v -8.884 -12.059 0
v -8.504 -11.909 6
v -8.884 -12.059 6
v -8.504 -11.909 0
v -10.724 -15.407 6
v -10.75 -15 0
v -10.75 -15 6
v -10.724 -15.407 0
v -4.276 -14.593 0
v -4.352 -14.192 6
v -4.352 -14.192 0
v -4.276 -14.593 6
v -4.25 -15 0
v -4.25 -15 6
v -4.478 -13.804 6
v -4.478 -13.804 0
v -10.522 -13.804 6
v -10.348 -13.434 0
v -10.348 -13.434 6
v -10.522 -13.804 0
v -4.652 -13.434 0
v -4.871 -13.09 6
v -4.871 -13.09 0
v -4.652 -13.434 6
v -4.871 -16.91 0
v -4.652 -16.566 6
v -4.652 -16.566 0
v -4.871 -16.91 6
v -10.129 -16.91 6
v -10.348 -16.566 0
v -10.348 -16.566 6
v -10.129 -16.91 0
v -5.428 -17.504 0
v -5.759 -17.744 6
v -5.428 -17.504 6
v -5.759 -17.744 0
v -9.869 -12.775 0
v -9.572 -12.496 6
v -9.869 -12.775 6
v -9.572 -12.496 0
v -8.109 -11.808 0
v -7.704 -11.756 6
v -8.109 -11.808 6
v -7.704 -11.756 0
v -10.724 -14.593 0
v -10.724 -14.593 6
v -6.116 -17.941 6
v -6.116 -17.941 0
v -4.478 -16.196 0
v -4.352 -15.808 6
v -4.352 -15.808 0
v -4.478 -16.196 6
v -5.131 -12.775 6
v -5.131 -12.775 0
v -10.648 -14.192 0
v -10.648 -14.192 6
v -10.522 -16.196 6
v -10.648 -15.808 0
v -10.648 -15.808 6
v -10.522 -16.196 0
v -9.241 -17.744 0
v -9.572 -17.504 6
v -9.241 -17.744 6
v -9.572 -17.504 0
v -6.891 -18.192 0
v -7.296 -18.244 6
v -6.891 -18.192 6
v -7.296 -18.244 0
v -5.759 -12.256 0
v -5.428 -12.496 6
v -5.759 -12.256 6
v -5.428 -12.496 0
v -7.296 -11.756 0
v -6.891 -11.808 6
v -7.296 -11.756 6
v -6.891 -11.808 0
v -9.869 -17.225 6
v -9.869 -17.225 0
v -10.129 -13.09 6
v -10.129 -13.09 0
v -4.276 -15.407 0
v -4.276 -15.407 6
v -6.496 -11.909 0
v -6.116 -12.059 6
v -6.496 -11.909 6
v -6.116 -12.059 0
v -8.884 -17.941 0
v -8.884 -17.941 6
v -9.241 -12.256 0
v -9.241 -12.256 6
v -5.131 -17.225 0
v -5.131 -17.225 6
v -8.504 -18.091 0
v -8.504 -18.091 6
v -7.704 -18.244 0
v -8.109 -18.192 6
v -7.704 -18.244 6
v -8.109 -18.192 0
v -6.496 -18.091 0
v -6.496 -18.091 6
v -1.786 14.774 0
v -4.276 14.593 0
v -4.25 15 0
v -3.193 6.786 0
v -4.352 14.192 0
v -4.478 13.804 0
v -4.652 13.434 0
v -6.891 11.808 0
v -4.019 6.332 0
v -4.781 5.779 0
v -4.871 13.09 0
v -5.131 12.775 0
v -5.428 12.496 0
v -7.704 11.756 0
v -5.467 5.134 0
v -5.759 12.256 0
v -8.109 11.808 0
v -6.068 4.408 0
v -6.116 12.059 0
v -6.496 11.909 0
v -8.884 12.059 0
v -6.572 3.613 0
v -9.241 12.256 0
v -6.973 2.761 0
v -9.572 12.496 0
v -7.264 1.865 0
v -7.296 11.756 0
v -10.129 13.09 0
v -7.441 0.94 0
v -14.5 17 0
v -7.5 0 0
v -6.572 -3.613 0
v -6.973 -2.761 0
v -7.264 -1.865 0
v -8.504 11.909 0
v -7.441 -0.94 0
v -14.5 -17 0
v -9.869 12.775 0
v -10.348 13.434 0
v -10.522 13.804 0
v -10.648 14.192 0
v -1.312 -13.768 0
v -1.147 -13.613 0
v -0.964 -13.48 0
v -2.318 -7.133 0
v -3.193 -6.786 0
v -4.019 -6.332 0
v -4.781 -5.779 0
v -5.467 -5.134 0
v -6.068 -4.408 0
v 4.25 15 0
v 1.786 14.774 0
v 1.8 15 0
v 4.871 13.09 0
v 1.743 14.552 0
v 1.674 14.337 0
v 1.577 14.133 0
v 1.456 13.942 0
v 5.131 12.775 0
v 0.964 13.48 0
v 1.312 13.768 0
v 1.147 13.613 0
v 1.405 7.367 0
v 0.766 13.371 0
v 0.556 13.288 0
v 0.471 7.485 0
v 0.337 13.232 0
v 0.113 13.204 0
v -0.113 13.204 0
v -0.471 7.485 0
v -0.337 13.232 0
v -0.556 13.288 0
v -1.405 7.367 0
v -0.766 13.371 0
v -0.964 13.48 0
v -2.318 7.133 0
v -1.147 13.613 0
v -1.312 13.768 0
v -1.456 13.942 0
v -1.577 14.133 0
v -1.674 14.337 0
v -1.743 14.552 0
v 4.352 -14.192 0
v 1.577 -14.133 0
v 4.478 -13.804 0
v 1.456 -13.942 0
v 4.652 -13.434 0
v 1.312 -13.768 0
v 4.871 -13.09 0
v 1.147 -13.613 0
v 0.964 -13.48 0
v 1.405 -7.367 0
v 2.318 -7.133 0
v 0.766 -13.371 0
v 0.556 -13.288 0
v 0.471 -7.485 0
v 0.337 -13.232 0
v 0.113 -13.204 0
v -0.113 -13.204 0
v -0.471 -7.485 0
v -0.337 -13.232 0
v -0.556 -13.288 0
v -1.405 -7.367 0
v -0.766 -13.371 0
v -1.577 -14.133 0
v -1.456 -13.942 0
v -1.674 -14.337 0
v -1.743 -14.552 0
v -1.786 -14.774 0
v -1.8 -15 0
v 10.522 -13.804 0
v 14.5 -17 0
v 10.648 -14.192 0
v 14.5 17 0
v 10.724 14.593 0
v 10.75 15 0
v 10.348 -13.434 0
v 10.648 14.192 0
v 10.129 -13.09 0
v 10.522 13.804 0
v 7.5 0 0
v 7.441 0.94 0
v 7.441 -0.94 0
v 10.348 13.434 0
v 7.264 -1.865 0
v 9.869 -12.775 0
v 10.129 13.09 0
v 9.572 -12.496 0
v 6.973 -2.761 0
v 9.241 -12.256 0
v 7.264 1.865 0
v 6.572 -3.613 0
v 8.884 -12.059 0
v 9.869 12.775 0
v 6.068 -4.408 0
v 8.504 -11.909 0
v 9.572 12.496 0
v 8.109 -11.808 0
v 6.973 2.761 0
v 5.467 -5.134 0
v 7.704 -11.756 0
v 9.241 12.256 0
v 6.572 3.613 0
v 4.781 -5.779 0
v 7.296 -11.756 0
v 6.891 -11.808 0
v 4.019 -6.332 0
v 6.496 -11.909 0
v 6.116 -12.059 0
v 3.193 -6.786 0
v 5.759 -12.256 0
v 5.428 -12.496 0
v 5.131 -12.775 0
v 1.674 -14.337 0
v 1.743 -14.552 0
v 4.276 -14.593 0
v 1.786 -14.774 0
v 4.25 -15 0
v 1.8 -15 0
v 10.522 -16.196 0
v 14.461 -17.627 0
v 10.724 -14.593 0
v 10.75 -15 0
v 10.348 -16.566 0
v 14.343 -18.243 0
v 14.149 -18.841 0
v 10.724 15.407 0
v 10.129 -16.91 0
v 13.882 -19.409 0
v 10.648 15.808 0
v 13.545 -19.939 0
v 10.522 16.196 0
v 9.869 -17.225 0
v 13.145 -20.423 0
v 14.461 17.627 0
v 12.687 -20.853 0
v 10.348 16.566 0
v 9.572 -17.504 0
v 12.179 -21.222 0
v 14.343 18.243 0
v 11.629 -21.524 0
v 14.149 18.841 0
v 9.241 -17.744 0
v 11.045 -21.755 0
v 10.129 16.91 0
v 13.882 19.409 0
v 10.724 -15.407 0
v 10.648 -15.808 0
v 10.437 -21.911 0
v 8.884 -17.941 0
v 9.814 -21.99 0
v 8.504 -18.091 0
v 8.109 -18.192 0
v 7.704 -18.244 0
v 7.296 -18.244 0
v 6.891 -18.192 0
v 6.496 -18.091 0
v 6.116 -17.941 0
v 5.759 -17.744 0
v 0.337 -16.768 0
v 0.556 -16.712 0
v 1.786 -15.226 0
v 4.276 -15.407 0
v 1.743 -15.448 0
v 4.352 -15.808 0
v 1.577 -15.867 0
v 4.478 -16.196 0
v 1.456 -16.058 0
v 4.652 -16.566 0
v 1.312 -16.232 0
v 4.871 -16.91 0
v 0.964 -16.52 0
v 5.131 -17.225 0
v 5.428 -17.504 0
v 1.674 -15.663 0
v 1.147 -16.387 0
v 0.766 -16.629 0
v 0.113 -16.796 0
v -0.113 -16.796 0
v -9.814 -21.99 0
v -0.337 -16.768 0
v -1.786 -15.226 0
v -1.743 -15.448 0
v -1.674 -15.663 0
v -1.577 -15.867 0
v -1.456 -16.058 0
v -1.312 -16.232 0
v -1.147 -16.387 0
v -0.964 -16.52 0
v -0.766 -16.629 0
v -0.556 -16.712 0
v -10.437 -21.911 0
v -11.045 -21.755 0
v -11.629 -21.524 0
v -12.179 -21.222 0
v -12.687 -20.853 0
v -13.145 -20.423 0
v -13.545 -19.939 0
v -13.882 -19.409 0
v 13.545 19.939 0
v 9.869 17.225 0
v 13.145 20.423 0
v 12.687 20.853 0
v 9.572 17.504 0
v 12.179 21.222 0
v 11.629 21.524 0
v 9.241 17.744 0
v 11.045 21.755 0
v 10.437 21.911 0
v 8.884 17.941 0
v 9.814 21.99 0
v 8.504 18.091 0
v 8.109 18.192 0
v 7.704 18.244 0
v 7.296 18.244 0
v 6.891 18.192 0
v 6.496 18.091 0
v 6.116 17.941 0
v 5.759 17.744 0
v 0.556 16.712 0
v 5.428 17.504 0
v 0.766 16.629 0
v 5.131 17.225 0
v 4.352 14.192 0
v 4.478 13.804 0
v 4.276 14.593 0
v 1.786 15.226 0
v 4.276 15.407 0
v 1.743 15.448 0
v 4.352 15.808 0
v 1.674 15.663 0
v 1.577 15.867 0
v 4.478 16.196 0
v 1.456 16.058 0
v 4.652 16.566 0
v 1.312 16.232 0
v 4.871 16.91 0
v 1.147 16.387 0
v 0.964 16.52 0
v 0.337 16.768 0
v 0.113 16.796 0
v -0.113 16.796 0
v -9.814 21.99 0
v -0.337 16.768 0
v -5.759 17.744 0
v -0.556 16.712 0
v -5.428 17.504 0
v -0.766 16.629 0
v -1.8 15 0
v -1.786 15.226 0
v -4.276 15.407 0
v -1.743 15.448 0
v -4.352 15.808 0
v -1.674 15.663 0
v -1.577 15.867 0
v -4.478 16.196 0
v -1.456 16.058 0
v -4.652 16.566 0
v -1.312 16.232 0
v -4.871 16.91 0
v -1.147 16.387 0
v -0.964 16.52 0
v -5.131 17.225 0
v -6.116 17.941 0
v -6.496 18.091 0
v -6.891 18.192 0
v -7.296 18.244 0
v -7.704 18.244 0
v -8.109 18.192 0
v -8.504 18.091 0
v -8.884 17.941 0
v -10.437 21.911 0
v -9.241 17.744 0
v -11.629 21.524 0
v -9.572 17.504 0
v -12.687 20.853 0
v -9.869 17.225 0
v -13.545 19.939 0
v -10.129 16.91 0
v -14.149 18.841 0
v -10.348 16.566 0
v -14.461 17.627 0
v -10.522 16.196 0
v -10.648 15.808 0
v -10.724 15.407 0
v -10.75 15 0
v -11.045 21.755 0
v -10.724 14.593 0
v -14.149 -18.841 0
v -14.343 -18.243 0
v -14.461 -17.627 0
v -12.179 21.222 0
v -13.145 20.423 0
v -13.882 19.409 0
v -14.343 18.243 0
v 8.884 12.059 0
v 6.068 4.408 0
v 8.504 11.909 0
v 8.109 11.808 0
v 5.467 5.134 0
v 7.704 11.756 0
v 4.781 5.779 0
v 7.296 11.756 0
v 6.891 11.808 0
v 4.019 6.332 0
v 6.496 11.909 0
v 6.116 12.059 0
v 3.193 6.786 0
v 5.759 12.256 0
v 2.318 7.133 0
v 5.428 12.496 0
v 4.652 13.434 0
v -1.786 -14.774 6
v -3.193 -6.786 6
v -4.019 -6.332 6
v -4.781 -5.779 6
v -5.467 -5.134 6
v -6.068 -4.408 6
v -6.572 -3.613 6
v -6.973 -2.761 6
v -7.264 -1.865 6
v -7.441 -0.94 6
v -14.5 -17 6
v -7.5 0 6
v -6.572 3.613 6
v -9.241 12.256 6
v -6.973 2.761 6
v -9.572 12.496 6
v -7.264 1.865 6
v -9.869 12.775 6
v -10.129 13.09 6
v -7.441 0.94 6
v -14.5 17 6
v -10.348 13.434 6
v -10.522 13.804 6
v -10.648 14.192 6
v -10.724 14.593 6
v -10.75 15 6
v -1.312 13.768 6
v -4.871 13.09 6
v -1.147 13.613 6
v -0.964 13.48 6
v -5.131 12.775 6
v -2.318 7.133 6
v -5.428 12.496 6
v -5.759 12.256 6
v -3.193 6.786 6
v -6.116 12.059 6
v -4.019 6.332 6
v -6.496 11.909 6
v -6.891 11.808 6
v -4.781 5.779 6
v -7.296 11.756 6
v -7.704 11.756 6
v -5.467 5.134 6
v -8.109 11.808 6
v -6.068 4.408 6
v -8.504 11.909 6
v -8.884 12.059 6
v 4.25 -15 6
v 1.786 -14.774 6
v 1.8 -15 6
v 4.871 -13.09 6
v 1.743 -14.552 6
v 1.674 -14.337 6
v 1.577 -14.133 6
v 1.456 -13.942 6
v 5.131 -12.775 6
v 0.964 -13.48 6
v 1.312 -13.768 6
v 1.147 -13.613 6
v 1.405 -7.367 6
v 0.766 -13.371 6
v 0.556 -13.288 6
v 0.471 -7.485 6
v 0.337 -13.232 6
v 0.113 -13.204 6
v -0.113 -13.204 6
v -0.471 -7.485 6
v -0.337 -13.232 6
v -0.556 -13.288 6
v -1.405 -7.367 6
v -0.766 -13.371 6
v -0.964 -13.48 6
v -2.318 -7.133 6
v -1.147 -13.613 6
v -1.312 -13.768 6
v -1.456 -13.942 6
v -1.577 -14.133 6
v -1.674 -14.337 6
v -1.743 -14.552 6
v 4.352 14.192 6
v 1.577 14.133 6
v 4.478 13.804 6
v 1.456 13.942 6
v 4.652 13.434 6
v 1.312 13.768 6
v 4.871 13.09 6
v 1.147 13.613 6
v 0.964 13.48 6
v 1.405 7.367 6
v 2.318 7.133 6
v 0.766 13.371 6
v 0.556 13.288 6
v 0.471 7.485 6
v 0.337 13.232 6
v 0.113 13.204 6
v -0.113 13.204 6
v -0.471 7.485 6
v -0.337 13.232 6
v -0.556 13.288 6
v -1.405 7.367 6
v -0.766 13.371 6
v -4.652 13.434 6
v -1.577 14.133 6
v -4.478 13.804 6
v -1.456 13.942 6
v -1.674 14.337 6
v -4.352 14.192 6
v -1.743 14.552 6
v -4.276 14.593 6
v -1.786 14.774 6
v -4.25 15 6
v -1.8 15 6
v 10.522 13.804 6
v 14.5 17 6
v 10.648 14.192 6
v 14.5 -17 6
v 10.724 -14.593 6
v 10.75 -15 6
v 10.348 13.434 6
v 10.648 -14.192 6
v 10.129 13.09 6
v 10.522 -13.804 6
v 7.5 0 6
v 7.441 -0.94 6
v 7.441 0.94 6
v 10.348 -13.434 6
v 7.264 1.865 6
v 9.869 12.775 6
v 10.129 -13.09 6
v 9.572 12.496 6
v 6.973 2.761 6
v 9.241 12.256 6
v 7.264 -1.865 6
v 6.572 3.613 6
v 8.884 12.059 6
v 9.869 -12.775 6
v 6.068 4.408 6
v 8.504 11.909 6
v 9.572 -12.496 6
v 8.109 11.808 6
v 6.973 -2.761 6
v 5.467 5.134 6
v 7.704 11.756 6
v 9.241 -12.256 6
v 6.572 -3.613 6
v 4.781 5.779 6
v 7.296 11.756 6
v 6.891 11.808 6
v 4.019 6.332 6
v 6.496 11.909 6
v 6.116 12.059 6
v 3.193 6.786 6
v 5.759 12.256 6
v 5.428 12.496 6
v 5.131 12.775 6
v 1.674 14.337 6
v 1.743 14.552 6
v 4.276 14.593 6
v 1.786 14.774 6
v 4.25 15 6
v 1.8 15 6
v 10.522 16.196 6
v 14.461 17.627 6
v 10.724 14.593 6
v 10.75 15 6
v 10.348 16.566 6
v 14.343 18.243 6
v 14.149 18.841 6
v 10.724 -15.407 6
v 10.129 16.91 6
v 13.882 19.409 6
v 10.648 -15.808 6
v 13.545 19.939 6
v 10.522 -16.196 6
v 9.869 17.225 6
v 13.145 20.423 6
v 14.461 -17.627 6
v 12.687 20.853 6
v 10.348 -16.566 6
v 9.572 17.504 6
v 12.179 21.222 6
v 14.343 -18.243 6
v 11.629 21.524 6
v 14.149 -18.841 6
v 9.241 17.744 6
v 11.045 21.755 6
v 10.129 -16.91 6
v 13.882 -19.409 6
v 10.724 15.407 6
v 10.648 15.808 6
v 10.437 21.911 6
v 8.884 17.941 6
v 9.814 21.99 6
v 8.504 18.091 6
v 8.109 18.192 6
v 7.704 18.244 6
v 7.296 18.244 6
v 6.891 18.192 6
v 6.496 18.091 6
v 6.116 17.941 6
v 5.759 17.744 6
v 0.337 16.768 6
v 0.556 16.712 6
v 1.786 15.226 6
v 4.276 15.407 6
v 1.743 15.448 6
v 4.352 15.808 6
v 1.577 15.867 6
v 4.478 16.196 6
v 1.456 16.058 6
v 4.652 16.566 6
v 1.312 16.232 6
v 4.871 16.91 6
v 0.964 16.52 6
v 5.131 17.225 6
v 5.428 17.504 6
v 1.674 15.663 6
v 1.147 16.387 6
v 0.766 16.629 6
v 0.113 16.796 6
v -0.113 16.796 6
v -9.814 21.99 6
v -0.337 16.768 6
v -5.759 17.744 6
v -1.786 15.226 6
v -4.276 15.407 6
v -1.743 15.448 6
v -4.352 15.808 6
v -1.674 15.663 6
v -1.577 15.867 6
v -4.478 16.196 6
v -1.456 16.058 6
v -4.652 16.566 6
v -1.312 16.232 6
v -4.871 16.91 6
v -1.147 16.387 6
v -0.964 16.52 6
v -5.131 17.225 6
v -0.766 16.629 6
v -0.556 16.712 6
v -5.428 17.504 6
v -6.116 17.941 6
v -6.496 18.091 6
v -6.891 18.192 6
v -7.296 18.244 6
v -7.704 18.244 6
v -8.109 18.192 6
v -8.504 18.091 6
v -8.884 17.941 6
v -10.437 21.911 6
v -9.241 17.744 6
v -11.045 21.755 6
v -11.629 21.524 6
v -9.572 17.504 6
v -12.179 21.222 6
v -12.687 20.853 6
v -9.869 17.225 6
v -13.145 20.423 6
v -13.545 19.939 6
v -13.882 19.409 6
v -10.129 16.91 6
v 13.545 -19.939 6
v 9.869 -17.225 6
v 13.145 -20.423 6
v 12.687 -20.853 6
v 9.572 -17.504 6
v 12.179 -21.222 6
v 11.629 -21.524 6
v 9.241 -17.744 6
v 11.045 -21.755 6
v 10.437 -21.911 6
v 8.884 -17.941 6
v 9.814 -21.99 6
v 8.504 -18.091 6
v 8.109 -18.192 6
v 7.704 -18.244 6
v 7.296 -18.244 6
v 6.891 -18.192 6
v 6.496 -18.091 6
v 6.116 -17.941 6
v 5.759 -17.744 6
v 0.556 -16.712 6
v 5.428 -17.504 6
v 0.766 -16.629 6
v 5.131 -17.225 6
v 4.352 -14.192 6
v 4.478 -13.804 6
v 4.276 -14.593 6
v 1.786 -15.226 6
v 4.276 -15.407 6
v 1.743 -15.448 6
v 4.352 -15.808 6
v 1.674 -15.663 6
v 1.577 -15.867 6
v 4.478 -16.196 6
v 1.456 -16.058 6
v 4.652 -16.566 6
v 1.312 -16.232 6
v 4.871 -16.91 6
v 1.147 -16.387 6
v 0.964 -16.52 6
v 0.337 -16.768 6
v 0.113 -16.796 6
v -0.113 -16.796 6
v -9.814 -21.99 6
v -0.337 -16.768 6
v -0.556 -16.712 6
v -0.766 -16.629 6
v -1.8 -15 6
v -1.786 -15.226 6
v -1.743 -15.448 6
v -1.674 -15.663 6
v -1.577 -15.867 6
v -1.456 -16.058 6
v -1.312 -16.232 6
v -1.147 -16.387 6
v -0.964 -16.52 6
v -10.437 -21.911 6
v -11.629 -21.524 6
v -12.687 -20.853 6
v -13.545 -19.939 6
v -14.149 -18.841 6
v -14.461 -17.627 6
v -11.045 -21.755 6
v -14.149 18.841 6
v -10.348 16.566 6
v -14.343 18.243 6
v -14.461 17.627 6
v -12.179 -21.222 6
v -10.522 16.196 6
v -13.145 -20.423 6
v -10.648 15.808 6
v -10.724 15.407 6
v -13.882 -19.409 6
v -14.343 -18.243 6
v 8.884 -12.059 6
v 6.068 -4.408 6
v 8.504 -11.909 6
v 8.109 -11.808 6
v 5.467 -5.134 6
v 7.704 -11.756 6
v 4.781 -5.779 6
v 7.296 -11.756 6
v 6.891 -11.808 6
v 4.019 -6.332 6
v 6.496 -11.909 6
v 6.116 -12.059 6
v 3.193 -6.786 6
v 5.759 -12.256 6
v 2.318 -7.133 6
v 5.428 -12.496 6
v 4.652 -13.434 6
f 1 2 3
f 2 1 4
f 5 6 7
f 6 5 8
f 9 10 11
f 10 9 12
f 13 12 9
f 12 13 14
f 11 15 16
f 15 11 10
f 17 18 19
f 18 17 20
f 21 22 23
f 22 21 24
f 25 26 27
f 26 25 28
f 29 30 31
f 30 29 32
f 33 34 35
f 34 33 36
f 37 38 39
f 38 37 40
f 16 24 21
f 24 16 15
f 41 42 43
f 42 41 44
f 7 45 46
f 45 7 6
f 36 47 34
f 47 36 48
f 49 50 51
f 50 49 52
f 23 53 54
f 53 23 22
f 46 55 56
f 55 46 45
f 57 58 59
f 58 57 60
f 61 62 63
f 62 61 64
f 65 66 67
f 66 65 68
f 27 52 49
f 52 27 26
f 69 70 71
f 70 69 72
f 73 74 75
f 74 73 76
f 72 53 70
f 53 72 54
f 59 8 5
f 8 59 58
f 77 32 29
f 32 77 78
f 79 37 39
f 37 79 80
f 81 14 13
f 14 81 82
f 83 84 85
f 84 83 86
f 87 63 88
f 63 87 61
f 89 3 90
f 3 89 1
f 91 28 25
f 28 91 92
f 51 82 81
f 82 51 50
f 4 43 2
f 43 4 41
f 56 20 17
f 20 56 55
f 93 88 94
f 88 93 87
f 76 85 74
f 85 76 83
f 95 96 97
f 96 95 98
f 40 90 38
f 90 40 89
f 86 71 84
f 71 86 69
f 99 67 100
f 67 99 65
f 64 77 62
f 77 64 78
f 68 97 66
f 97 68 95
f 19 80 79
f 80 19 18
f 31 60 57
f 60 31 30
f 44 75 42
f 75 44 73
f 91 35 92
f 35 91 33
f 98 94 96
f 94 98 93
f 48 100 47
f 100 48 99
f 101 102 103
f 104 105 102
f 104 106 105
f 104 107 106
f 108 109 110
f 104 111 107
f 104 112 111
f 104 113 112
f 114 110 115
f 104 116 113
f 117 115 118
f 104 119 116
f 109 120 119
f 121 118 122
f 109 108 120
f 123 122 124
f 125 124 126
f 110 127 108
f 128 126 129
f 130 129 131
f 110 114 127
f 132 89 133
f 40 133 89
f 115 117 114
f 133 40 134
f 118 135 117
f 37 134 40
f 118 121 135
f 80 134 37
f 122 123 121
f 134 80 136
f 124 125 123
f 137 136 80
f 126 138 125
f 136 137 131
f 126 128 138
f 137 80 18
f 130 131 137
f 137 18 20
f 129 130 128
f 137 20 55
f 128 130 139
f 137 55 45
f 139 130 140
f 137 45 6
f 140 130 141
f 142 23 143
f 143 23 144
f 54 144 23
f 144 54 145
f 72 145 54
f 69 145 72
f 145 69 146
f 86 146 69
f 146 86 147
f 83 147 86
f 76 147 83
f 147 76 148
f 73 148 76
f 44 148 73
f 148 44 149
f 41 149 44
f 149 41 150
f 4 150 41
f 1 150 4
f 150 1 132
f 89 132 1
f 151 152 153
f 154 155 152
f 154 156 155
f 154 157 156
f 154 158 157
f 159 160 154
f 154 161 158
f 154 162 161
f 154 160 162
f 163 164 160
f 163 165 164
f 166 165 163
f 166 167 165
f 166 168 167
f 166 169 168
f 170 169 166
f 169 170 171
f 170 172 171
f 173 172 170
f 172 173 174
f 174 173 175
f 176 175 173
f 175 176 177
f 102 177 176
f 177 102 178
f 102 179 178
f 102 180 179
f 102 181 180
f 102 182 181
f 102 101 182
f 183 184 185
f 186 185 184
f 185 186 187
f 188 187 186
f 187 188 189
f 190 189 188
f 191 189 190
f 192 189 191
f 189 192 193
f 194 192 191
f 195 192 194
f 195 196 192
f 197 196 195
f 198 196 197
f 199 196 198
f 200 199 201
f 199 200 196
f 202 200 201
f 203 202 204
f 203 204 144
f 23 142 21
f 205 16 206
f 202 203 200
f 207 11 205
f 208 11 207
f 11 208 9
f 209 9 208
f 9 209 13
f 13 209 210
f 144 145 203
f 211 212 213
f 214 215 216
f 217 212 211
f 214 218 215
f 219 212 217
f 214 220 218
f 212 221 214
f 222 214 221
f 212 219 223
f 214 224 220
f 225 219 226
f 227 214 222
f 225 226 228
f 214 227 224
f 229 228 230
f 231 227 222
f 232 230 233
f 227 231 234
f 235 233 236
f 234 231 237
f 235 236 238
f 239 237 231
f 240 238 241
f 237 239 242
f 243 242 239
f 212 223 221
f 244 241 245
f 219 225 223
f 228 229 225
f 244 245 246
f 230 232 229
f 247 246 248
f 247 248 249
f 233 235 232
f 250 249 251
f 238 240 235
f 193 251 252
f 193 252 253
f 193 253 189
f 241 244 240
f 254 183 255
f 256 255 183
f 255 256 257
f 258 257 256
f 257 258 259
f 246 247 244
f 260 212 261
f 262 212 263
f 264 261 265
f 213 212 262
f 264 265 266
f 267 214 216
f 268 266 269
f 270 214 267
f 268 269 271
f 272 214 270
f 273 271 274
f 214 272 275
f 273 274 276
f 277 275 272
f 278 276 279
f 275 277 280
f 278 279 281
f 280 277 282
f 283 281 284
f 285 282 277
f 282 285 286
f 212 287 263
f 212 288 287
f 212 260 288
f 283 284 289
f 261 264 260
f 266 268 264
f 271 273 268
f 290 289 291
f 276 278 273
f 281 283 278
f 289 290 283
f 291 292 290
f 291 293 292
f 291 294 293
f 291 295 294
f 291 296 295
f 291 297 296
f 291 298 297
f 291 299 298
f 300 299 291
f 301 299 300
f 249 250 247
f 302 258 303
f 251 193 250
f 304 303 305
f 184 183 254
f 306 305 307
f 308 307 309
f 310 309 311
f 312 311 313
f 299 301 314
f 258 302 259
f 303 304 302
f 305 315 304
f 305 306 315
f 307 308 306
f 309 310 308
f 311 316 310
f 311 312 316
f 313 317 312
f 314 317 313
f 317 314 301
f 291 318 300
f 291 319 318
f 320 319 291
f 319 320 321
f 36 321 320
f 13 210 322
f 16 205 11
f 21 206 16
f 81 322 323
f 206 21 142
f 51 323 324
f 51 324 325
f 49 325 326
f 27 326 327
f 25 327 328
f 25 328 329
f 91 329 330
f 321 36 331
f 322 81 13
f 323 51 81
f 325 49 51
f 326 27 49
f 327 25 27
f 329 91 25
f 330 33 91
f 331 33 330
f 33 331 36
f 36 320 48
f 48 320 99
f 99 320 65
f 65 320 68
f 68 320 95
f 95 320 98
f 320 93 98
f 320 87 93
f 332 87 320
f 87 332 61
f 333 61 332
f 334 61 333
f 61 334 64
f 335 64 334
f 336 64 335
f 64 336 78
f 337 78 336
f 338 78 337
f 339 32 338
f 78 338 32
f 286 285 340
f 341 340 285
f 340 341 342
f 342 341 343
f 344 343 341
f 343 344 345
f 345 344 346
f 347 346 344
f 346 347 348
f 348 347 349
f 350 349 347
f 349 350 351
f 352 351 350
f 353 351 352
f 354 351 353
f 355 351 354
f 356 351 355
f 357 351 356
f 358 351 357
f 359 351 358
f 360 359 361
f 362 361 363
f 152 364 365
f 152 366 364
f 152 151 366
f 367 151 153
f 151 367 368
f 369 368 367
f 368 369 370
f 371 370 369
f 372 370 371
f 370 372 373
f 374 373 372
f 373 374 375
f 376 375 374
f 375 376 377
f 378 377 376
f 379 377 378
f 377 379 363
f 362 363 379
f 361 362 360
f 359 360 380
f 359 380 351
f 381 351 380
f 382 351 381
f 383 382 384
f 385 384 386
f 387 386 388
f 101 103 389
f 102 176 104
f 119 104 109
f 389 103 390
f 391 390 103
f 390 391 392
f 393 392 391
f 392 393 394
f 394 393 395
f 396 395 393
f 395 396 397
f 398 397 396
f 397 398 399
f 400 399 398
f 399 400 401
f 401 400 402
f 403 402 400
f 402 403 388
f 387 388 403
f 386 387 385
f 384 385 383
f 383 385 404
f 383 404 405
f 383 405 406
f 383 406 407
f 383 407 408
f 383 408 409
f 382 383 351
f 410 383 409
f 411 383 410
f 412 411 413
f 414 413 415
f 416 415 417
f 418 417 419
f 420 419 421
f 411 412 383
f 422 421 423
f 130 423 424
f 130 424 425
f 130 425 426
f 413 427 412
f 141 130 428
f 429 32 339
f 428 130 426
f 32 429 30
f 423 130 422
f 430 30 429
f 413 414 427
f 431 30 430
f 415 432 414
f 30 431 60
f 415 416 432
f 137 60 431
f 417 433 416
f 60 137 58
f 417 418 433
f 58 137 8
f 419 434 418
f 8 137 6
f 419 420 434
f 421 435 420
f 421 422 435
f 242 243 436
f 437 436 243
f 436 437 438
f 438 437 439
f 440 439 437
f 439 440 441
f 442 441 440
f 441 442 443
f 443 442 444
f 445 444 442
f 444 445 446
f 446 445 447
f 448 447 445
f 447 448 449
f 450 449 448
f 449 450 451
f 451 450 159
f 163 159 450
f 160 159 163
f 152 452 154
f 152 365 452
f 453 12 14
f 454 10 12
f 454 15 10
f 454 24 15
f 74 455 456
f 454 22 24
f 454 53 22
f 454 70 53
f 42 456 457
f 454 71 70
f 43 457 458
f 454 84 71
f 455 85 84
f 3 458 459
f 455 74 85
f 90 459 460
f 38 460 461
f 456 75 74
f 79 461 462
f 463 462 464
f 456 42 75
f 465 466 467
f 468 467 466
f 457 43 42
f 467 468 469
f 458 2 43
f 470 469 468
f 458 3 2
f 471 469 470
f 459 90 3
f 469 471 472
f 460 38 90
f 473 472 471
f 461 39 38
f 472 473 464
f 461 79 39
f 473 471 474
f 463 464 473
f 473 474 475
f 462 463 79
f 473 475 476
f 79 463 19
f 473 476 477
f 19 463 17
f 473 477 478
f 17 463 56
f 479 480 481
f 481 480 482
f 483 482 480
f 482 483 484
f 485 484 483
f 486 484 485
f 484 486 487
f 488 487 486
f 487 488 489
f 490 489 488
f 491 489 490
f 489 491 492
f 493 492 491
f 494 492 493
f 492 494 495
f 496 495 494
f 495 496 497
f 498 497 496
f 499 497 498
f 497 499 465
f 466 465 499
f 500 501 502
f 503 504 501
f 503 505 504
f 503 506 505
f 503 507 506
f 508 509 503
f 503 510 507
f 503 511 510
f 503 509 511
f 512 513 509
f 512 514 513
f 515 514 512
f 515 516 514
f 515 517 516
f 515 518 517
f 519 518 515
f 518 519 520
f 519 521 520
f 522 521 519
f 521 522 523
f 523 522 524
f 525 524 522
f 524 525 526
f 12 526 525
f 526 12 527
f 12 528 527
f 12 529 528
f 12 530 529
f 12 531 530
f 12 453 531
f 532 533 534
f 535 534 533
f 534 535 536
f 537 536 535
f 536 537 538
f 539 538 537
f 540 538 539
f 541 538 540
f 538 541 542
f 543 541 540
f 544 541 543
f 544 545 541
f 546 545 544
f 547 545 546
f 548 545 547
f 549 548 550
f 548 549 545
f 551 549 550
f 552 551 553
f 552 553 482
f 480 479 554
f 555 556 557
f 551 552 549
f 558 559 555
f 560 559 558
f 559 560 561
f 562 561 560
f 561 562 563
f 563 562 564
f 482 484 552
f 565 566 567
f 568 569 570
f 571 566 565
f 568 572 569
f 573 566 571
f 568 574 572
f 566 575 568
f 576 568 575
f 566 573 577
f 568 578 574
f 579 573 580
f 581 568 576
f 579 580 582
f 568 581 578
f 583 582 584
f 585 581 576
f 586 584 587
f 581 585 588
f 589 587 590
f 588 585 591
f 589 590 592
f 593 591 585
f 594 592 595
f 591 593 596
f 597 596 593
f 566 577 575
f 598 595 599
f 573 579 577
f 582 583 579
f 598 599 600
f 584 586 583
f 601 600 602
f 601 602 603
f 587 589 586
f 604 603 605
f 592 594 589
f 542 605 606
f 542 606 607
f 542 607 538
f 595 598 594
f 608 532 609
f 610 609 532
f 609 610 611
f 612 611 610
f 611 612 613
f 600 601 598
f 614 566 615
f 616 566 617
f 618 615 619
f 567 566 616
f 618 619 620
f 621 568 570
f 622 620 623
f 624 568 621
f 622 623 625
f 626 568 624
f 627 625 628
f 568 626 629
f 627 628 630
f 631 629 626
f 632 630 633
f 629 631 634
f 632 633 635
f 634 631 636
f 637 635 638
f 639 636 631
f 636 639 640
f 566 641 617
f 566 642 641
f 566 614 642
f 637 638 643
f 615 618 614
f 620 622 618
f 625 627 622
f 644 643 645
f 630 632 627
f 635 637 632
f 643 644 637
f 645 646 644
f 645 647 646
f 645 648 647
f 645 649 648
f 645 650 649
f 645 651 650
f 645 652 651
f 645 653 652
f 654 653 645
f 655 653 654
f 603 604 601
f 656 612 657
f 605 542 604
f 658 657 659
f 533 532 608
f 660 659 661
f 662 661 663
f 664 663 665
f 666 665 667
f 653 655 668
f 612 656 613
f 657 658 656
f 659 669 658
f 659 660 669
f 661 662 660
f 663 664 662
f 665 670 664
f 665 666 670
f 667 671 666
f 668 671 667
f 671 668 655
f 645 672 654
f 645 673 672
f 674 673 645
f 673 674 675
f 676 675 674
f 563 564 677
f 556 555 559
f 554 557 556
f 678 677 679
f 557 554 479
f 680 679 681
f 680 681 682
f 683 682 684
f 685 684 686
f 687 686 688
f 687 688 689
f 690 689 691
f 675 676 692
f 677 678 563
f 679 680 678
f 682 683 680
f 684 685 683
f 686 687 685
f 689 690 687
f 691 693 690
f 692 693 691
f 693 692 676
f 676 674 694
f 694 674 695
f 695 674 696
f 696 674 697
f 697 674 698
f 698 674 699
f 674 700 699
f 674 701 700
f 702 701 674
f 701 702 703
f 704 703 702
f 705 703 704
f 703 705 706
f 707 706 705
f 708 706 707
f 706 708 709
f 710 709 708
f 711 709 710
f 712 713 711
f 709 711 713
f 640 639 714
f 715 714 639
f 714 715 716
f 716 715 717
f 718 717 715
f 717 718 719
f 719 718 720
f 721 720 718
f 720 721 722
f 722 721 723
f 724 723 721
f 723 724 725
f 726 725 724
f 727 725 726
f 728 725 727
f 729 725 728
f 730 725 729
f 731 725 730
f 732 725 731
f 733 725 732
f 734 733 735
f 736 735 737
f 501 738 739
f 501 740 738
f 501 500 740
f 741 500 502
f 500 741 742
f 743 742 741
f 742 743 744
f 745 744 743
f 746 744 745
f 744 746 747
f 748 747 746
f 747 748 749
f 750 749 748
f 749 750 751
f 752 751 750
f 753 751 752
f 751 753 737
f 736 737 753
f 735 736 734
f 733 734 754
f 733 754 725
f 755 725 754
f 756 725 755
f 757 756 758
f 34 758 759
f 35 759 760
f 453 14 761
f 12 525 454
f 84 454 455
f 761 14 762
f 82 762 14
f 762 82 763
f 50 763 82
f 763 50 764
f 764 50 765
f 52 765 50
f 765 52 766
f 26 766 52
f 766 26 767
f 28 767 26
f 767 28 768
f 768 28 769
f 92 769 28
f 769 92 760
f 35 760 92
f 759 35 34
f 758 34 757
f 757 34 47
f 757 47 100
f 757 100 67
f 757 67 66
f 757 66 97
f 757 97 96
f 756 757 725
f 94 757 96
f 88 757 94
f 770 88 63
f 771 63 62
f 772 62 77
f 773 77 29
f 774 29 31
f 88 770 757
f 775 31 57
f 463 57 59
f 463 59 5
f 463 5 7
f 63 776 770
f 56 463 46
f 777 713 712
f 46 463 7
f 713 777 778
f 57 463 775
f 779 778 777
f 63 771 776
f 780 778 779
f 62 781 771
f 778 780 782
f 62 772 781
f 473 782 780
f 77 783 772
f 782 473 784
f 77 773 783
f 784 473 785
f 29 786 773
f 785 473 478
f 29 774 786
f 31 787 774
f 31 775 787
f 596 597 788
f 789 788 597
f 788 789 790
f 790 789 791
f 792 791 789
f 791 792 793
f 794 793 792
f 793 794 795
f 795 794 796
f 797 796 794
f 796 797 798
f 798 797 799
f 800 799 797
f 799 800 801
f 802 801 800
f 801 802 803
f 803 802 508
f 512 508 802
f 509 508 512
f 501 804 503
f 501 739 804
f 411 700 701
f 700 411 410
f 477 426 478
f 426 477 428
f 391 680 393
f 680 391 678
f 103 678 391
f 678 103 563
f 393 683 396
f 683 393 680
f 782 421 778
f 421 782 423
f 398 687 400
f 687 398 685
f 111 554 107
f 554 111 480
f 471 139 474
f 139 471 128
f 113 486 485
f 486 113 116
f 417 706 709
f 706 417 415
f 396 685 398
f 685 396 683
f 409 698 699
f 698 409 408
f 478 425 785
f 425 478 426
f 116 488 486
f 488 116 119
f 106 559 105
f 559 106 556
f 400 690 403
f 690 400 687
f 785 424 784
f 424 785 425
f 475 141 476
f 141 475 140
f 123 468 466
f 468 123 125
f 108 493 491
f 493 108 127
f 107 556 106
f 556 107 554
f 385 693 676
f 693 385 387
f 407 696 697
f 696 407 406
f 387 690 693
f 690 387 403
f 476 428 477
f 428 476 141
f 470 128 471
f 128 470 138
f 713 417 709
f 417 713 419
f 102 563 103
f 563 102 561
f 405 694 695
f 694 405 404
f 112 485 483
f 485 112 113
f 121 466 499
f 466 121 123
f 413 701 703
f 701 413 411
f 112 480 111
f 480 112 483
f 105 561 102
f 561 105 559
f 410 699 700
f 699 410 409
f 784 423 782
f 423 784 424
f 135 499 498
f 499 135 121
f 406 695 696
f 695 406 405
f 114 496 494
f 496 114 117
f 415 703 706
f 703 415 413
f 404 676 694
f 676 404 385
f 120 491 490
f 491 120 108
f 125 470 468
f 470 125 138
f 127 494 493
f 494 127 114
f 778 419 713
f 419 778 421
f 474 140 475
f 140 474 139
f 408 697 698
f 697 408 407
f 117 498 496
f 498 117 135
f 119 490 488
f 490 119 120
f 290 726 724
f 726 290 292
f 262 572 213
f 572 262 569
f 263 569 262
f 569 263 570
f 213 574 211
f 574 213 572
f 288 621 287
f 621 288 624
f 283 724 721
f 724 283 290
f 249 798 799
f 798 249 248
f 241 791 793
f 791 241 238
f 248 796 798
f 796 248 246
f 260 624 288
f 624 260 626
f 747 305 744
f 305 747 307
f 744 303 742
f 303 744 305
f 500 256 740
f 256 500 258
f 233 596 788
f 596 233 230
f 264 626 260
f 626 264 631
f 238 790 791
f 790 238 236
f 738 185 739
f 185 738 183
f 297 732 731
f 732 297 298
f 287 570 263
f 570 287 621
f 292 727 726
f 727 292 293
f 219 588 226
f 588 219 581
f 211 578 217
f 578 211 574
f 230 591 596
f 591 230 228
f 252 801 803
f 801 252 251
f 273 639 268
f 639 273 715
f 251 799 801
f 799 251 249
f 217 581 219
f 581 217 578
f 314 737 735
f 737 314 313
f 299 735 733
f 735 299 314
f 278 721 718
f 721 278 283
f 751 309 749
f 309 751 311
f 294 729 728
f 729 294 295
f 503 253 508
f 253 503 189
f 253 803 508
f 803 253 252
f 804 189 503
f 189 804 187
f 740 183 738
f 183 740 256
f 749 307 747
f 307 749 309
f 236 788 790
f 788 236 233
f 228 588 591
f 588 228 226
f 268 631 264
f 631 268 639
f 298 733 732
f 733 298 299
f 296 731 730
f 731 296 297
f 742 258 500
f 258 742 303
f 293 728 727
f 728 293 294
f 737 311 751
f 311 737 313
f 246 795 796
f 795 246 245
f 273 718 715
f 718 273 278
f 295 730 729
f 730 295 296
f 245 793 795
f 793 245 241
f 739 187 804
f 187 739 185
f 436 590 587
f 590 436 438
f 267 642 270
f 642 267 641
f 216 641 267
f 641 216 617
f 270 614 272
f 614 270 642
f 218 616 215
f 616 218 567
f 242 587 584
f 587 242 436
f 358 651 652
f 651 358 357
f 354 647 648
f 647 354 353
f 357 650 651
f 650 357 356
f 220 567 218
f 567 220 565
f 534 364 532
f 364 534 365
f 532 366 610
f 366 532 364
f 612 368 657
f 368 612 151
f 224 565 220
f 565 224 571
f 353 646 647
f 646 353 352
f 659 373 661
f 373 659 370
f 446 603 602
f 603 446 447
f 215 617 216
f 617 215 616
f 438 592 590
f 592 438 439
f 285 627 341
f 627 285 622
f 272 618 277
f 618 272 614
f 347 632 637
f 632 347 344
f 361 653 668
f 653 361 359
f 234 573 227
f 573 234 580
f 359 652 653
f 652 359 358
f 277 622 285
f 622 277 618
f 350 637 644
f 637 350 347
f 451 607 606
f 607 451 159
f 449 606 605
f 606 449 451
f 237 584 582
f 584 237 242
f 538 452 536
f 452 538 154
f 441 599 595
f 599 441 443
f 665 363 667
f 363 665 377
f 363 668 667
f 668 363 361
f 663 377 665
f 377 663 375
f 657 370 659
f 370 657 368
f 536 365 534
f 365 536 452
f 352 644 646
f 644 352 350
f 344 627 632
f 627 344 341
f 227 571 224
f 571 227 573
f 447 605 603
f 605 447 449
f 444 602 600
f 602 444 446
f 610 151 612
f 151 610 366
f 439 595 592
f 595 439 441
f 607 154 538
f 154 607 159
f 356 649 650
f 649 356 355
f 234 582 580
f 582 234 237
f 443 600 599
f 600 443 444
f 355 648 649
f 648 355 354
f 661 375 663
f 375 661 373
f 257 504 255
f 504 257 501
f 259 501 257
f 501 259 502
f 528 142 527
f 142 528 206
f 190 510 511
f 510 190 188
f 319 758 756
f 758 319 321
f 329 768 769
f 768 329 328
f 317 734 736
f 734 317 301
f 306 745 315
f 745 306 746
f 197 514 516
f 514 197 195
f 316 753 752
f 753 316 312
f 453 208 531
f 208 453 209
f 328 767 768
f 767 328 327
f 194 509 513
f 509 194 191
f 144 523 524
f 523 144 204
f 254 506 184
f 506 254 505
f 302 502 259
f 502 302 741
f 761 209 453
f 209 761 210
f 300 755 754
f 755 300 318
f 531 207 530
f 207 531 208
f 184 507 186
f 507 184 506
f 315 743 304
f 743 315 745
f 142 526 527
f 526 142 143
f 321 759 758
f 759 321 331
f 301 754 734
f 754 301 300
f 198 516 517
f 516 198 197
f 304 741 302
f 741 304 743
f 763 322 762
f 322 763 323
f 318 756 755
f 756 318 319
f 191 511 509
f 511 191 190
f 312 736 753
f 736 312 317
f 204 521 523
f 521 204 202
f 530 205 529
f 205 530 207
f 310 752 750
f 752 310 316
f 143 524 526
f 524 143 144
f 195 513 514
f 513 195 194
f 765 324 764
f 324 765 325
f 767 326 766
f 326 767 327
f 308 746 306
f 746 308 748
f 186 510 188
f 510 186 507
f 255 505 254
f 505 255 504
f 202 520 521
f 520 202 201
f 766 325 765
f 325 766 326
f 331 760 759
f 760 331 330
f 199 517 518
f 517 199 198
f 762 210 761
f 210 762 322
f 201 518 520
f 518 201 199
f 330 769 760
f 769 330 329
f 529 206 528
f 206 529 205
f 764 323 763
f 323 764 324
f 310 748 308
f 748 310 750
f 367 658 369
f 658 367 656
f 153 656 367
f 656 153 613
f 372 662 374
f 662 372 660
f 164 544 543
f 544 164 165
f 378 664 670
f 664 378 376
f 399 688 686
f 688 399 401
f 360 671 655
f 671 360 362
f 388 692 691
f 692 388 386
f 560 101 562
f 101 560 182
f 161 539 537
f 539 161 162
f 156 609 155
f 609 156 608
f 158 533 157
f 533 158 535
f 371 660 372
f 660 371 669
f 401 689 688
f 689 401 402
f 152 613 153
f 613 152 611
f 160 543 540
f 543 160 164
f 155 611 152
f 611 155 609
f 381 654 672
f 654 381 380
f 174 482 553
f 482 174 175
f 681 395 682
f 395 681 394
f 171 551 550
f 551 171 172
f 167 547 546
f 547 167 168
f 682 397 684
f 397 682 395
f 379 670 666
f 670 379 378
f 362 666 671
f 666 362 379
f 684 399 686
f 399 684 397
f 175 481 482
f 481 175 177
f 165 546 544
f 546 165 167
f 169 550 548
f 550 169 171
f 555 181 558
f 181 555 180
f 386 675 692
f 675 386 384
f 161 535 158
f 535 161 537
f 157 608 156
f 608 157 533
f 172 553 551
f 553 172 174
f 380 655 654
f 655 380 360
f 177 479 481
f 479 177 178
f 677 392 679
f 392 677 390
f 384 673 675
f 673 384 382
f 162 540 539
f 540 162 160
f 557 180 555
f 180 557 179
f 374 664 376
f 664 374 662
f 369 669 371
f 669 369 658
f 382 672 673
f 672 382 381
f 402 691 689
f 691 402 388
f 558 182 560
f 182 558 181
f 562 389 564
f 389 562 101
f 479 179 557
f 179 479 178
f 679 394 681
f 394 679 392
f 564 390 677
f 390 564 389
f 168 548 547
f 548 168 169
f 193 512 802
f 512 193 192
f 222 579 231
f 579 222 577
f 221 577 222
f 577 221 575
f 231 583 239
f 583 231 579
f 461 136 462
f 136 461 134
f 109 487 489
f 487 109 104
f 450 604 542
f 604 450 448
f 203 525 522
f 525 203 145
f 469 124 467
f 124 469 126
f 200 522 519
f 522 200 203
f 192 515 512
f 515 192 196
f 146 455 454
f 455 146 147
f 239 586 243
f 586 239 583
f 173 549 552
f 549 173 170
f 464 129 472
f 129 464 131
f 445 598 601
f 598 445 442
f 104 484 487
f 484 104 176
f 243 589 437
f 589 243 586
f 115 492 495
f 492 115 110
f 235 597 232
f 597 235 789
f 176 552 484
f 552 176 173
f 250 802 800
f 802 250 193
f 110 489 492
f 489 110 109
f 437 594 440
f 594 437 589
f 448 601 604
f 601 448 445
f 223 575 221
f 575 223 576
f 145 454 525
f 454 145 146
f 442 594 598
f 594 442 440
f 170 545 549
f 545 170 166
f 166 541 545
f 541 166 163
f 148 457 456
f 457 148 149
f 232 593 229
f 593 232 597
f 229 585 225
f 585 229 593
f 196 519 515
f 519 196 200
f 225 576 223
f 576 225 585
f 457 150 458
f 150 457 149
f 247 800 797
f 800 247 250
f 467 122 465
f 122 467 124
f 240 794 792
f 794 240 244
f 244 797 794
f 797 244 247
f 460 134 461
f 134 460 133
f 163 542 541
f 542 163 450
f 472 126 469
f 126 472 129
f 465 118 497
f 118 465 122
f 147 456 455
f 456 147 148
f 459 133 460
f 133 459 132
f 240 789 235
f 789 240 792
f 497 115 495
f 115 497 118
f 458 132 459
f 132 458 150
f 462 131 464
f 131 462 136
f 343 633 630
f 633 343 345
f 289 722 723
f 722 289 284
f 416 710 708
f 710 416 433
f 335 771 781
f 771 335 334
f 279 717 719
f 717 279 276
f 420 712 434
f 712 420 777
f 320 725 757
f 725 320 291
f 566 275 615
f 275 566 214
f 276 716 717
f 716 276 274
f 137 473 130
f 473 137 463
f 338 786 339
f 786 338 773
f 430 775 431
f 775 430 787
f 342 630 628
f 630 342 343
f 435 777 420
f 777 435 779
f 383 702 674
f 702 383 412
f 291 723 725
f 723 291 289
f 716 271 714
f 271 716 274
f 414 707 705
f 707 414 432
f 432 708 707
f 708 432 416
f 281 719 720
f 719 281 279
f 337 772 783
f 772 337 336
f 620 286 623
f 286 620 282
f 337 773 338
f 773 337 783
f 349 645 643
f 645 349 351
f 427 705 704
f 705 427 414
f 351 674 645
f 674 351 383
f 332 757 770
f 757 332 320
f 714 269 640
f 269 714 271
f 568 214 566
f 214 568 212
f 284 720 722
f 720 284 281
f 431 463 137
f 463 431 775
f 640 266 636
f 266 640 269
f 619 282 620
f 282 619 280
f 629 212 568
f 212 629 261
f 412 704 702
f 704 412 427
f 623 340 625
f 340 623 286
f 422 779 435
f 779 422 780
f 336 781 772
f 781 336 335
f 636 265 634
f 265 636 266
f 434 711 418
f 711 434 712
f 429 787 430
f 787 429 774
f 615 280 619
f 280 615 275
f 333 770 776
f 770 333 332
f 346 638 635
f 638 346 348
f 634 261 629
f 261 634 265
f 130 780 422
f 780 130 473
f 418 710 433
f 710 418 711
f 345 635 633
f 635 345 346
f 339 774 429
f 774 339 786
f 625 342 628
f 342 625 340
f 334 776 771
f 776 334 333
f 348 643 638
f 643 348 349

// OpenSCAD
$fn = 50;

difference() {
	union() {
		hull() {
			translate(v = [-9.5, 17.0, 0]) {
				cylinder(h = 6, r = 5);
			}
			translate(v = [9.5, 17.0, 0]) {
				cylinder(h = 6, r = 5);
			}
			translate(v = [-9.5, -17.0, 0]) {
				cylinder(h = 6, r = 5);
			}
			translate(v = [9.5, -17.0, 0]) {
				cylinder(h = 6, r = 5);
			}
		}
	}
	union() {
		translate(v = [-7.5, -15.0, 0]) {
			cylinder(h = 6, r = 3.25);
		}
		translate(v = [-7.5, 15.0, 0]) {
			cylinder(h = 6, r = 3.25);
		}
		translate(v = [7.5, -15.0, 0]) {
			cylinder(h = 6, r = 3.25);
		}
		translate(v = [7.5, 15.0, 0]) {
			cylinder(h = 6, r = 3.25);
		}
		translate(v = [0.0, -15.0, 0]) {
			cylinder(h = 6, r = 1.8);
		}
		translate(v = [0.0, 15.0, 0]) {
			cylinder(h = 6, r = 1.8);
		}
		cylinder(h = 6, r = 7.5);
	}
}
